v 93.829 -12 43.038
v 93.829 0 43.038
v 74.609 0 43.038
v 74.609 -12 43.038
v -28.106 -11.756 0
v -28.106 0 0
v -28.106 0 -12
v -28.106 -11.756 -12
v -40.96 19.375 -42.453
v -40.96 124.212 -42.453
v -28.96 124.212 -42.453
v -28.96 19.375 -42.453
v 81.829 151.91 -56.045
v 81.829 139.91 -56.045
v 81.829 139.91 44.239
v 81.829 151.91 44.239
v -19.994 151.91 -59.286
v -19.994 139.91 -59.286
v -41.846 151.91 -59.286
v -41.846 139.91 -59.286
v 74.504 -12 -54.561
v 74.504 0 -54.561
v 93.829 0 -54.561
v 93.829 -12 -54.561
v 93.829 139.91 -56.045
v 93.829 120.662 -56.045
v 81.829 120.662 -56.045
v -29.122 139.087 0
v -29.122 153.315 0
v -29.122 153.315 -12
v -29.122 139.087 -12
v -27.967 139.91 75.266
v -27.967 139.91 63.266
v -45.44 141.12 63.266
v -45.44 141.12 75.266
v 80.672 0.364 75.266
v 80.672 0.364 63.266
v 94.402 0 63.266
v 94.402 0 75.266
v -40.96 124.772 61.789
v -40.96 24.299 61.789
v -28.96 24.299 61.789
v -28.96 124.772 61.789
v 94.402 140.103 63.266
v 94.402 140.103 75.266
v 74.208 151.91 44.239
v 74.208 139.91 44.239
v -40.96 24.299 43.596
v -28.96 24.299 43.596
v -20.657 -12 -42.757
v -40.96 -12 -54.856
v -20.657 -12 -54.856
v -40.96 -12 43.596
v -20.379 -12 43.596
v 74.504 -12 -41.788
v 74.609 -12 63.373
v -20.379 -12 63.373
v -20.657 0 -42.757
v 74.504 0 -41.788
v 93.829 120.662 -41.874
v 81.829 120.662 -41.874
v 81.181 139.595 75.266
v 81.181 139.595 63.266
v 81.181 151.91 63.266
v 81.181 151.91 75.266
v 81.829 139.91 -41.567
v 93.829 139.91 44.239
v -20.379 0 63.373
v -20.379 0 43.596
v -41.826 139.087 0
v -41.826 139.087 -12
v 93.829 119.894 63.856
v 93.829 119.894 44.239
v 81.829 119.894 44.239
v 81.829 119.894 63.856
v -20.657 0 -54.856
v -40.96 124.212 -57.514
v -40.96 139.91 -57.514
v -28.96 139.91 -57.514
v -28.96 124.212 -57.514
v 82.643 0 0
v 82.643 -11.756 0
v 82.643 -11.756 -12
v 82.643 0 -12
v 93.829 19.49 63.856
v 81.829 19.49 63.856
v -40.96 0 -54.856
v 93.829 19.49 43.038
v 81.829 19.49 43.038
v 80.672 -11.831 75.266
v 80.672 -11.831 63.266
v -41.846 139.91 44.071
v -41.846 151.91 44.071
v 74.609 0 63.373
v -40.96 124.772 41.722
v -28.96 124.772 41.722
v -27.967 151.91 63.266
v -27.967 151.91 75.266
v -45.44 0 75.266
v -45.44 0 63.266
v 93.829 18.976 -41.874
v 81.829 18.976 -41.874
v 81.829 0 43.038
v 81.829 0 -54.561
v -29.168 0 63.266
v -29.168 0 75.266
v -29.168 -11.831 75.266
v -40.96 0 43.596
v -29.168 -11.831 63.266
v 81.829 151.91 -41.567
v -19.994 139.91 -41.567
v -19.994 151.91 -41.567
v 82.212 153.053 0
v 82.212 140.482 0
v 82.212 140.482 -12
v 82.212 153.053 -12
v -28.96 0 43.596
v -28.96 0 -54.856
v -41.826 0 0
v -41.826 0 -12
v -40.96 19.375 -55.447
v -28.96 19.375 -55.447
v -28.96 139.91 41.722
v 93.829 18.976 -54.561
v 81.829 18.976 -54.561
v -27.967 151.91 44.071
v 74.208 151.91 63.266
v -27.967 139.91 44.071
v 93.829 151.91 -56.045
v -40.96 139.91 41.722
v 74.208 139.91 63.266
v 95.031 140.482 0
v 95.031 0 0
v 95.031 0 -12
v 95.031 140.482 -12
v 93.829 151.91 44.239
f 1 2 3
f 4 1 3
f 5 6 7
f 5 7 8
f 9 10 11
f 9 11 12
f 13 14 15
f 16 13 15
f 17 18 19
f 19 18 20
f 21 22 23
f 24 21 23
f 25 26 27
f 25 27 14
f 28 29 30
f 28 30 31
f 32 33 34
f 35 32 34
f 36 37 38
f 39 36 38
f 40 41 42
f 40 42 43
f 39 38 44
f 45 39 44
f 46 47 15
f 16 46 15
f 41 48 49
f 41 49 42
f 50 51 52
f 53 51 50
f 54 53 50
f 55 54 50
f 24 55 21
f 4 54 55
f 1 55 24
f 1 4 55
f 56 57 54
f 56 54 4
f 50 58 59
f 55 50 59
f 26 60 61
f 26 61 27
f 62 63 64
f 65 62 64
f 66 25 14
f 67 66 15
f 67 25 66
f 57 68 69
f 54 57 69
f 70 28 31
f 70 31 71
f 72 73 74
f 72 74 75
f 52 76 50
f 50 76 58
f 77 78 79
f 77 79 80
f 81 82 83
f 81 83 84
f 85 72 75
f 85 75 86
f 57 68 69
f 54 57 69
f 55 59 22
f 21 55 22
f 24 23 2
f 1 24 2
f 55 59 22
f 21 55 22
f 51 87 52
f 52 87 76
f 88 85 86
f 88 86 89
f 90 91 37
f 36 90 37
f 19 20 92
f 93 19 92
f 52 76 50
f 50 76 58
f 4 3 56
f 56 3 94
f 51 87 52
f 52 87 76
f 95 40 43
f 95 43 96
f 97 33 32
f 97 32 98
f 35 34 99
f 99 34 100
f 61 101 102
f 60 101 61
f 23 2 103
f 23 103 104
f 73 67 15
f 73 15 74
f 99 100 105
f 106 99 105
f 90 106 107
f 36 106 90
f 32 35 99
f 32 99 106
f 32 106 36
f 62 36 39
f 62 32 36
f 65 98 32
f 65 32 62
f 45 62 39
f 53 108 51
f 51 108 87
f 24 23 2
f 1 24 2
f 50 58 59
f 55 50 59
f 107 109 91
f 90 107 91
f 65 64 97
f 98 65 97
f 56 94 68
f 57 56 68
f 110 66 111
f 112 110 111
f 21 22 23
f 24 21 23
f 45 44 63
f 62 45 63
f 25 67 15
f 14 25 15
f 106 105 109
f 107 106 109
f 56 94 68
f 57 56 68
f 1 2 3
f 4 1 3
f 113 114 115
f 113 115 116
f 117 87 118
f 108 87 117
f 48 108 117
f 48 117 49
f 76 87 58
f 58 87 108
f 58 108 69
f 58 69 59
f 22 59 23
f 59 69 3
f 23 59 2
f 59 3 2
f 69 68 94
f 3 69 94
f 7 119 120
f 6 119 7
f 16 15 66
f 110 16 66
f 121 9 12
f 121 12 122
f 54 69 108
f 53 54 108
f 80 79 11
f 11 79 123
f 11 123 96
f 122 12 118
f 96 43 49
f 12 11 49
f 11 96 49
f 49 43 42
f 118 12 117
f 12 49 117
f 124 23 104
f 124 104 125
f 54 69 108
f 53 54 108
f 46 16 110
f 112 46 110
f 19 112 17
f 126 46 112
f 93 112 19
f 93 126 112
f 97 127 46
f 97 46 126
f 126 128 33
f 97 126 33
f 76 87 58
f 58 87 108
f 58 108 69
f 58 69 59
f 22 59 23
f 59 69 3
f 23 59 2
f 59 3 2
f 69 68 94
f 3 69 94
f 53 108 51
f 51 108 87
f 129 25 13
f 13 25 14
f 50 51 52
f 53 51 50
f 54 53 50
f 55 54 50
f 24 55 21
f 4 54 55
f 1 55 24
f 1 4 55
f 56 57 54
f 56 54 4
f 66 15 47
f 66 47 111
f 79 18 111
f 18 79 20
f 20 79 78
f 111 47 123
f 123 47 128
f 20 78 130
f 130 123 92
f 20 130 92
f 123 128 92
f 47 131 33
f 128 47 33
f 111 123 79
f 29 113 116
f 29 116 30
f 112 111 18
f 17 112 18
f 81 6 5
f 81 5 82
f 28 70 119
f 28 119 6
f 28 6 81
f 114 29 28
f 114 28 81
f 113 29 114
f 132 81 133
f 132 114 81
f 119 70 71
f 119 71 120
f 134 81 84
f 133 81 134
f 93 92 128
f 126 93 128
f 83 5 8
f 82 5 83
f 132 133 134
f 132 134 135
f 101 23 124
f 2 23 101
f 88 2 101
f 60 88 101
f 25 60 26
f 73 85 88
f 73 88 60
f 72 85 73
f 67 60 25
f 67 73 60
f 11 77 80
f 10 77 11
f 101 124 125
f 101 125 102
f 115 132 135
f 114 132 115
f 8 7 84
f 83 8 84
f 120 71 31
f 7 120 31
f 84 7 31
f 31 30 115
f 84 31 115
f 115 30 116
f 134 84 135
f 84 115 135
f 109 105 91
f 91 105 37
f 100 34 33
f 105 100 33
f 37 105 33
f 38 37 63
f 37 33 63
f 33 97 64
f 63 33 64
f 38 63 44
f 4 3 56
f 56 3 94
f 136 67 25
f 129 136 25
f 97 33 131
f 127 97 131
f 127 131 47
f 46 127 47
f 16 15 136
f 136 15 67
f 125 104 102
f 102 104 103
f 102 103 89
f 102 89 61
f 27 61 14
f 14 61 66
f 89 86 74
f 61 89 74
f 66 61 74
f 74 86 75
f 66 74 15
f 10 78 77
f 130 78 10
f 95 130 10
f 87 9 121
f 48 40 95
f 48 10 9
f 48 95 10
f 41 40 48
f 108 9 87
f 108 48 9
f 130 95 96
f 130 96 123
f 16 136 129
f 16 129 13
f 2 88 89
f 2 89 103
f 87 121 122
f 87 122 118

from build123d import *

# Parameters (mm, degrees)
F1_DEPTH  = 12
F3_DEPTH  = 12
F5_DEPTH  = 12
F6_DEPTH  = 12
F8_DEPTH  = 12
F9_DEPTH  = 12
F11_DEPTH = 12
F12_W     = 102.175297
F12_H     = 12
F13_DEPTH = 12


with BuildPart() as f1:
    # F0 (on Front) → F1 (new body)
    with BuildSketch(Plane.XZ):
        Polygon((-40.960394, 43.595516), (-40.960394, -54.856028), (-20.657198, -54.856028), (-20.657198, -42.756835), (74.503601, -41.788211), (74.503601, -54.560725), (93.829302, -54.560725), (93.829302, 43.038404), (74.608948, 43.038404), (74.608948, 63.372989), (-20.378642, 63.372989), (-20.378642, 43.595516), align=None)
    extrude(amount=F1_DEPTH)


with BuildPart() as f3:
    # F2 (on face) → F3 (new body)
    with BuildSketch(Plane.YZ.offset(93.829302)):
        Polygon((19.490086, 43.038404), (0, 43.038404), (0, -54.560725), (18.975705, -54.560725), (18.975705, -41.87429), (120.662093, -41.87429), (120.662093, -56.044541), (139.90967, -56.044541), (139.90967, 44.238716), (119.893558, 44.238716), (119.893558, 63.856304), (19.490086, 63.856304), align=None)
    extrude(amount=-F3_DEPTH)



with BuildPart() as f5:
    # F4 (on face) → F5 (new body)
    with BuildSketch(Plane(origin=(-40.960394, 0, 0), x_dir=(0, -1, 0), z_dir=(-1, 0, 0))):
        Polygon((0, -54.856028), (0, 43.595516), (-24.298657, 43.595516), (-24.298657, 61.788741), (-124.772109, 61.788741), (-124.772109, 41.72213), (-145.474121, 41.72213), (-145.474121, -57.513867), (-124.212138, -57.513867), (-124.212138, -42.453248), (-19.374812, -42.453248), (-19.374812, -55.44664), align=None)
    extrude(amount=-F5_DEPTH)


with BuildPart() as f6:
    # F0 (on Front) → F6 (new body)
    with BuildSketch(Plane.XZ):
        Polygon((-40.960394, 43.595516), (-40.960394, -54.856028), (-20.657198, -54.856028), (-20.657198, -42.756835), (74.503601, -41.788211), (74.503601, -54.560725), (93.829302, -54.560725), (93.829302, 43.038404), (74.608948, 43.038404), (74.608948, 63.372989), (-20.378642, 63.372989), (-20.378642, 43.595516), align=None)
    extrude(amount=F6_DEPTH)


with BuildPart() as f3_1:
    add(f3.part)

    add(f5.part)  # F8 merges F5
    # F7 (on face) → F8 (join)
    with BuildSketch(Plane(origin=(0, 139.90967, 0), x_dir=(-1, 0, 0), z_dir=(0, 1, 0))):
        Polygon((-74.208297, 44.238716), (-81.829302, 44.238716), (-81.829302, -41.567333), (19.993784, -41.567333), (19.993784, -59.285596), (41.846298, -59.285596), (41.846298, 44.070918), (27.967, 44.070918), (27.967, 63.265696), (-74.208297, 63.265696), align=None)
    extrude(amount=F8_DEPTH)


with BuildPart() as f9:
    # F7 (on face) → F9 (new body)
    with BuildSketch(Plane(origin=(0, 139.90967, 0), x_dir=(-1, 0, 0), z_dir=(0, 1, 0))):
        Polygon((-81.829302, 44.238716), (-93.829302, 44.238716), (-93.829302, -56.044541), (-81.829302, -56.044541), (-81.829302, -41.567333), align=None)
    extrude(amount=F9_DEPTH)


with BuildPart() as f11:
    # F10 (on Top) → F11 (new body)
    with BuildSketch(Plane.XY):
        Polygon((82.212083, 153.052658), (-29.122176, 153.315097), (-29.122176, 139.087111), (-41.825727, 139.087111), (-41.825727, 0), (-28.105892, 0), (-28.105892, -11.756198), (82.643062, -11.756198), (82.643062, 0), (95.030926, 0), (95.030926, 140.482232), (82.212083, 140.482232), align=None)
    extrude(amount=-F11_DEPTH)


with BuildPart() as f13:
    # F12 (on face) → F13 (new body)
    with BuildSketch(Plane.XY.offset(63.265696)):
        Polygon((74.208297, 139.90967), (-27.967, 139.90967), (-45.440353, 141.119689), (-45.440353, 0), (-29.16773, 0), (-29.16773, -11.831072), (80.672473, -11.831072), (80.672473, 0.364338), (94.402492, 0), (94.402492, 140.1034), (81.18099, 139.595255), (81.18099, 151.90967), (74.208297, 151.90967), align=None)
        with Locations((23.120649, 145.90967)):
            Rectangle(F12_W, F12_H)
    extrude(amount=F13_DEPTH)


solid = Compound([f1.part, f6.part, f3_1.part, f9.part, f11.part, f13.part])
